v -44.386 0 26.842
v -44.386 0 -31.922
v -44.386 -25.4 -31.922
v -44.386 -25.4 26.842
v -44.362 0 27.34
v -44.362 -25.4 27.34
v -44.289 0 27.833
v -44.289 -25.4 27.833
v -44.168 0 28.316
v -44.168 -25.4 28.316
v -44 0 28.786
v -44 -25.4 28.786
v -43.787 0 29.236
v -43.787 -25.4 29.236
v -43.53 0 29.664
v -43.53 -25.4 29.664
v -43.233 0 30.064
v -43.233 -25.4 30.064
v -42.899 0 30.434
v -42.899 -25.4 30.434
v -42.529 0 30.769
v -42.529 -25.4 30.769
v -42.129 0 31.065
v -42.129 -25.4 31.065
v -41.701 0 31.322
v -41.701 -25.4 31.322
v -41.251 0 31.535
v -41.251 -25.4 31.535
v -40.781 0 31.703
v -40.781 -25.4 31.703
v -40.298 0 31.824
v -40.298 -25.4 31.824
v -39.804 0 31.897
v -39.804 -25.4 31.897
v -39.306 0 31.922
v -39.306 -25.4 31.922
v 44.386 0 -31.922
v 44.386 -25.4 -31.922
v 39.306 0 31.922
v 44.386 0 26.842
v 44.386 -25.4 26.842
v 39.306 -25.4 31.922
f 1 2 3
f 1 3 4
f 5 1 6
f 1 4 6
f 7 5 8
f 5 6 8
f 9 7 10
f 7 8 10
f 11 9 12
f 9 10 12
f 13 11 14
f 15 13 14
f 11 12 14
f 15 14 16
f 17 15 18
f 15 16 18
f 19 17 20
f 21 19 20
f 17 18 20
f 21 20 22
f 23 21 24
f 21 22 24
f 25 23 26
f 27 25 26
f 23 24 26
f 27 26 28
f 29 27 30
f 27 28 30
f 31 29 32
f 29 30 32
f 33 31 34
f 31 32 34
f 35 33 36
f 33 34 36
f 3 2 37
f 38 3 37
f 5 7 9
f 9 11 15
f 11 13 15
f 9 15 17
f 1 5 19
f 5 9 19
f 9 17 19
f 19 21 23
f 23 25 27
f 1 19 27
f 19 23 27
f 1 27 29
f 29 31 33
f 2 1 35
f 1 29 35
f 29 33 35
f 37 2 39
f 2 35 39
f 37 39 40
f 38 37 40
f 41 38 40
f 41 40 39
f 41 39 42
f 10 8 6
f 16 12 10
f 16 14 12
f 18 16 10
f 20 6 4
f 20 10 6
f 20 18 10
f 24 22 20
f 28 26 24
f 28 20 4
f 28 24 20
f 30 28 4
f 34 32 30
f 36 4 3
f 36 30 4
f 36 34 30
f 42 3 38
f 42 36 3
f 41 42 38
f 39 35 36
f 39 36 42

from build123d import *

# Parameters (mm, degrees)
F0_W     = 88.773
F0_H     = 63.843242
F1_DEPTH = 25.4
F2_R     = 5.08
F3_SIZE  = 5.08


with BuildPart() as f1:
    # F0 (on Front) → F1 (new body)
    with BuildSketch(Plane.XZ):
        Rectangle(F0_W, F0_H)
    extrude(amount=F1_DEPTH)

    # F2
    f2_edges = [f1.edges().sort_by_distance(p)[0] for p in [
        (-44.3865, -12.7, 31.921621),
    ]]
    fillet(f2_edges, radius=F2_R)

    # F3
    f3_edges = [f1.edges().sort_by_distance(p)[0] for p in [
        (44.3865, -12.7, 31.921621),
    ]]
    chamfer(f3_edges, length=F3_SIZE)


solid = f1.part
